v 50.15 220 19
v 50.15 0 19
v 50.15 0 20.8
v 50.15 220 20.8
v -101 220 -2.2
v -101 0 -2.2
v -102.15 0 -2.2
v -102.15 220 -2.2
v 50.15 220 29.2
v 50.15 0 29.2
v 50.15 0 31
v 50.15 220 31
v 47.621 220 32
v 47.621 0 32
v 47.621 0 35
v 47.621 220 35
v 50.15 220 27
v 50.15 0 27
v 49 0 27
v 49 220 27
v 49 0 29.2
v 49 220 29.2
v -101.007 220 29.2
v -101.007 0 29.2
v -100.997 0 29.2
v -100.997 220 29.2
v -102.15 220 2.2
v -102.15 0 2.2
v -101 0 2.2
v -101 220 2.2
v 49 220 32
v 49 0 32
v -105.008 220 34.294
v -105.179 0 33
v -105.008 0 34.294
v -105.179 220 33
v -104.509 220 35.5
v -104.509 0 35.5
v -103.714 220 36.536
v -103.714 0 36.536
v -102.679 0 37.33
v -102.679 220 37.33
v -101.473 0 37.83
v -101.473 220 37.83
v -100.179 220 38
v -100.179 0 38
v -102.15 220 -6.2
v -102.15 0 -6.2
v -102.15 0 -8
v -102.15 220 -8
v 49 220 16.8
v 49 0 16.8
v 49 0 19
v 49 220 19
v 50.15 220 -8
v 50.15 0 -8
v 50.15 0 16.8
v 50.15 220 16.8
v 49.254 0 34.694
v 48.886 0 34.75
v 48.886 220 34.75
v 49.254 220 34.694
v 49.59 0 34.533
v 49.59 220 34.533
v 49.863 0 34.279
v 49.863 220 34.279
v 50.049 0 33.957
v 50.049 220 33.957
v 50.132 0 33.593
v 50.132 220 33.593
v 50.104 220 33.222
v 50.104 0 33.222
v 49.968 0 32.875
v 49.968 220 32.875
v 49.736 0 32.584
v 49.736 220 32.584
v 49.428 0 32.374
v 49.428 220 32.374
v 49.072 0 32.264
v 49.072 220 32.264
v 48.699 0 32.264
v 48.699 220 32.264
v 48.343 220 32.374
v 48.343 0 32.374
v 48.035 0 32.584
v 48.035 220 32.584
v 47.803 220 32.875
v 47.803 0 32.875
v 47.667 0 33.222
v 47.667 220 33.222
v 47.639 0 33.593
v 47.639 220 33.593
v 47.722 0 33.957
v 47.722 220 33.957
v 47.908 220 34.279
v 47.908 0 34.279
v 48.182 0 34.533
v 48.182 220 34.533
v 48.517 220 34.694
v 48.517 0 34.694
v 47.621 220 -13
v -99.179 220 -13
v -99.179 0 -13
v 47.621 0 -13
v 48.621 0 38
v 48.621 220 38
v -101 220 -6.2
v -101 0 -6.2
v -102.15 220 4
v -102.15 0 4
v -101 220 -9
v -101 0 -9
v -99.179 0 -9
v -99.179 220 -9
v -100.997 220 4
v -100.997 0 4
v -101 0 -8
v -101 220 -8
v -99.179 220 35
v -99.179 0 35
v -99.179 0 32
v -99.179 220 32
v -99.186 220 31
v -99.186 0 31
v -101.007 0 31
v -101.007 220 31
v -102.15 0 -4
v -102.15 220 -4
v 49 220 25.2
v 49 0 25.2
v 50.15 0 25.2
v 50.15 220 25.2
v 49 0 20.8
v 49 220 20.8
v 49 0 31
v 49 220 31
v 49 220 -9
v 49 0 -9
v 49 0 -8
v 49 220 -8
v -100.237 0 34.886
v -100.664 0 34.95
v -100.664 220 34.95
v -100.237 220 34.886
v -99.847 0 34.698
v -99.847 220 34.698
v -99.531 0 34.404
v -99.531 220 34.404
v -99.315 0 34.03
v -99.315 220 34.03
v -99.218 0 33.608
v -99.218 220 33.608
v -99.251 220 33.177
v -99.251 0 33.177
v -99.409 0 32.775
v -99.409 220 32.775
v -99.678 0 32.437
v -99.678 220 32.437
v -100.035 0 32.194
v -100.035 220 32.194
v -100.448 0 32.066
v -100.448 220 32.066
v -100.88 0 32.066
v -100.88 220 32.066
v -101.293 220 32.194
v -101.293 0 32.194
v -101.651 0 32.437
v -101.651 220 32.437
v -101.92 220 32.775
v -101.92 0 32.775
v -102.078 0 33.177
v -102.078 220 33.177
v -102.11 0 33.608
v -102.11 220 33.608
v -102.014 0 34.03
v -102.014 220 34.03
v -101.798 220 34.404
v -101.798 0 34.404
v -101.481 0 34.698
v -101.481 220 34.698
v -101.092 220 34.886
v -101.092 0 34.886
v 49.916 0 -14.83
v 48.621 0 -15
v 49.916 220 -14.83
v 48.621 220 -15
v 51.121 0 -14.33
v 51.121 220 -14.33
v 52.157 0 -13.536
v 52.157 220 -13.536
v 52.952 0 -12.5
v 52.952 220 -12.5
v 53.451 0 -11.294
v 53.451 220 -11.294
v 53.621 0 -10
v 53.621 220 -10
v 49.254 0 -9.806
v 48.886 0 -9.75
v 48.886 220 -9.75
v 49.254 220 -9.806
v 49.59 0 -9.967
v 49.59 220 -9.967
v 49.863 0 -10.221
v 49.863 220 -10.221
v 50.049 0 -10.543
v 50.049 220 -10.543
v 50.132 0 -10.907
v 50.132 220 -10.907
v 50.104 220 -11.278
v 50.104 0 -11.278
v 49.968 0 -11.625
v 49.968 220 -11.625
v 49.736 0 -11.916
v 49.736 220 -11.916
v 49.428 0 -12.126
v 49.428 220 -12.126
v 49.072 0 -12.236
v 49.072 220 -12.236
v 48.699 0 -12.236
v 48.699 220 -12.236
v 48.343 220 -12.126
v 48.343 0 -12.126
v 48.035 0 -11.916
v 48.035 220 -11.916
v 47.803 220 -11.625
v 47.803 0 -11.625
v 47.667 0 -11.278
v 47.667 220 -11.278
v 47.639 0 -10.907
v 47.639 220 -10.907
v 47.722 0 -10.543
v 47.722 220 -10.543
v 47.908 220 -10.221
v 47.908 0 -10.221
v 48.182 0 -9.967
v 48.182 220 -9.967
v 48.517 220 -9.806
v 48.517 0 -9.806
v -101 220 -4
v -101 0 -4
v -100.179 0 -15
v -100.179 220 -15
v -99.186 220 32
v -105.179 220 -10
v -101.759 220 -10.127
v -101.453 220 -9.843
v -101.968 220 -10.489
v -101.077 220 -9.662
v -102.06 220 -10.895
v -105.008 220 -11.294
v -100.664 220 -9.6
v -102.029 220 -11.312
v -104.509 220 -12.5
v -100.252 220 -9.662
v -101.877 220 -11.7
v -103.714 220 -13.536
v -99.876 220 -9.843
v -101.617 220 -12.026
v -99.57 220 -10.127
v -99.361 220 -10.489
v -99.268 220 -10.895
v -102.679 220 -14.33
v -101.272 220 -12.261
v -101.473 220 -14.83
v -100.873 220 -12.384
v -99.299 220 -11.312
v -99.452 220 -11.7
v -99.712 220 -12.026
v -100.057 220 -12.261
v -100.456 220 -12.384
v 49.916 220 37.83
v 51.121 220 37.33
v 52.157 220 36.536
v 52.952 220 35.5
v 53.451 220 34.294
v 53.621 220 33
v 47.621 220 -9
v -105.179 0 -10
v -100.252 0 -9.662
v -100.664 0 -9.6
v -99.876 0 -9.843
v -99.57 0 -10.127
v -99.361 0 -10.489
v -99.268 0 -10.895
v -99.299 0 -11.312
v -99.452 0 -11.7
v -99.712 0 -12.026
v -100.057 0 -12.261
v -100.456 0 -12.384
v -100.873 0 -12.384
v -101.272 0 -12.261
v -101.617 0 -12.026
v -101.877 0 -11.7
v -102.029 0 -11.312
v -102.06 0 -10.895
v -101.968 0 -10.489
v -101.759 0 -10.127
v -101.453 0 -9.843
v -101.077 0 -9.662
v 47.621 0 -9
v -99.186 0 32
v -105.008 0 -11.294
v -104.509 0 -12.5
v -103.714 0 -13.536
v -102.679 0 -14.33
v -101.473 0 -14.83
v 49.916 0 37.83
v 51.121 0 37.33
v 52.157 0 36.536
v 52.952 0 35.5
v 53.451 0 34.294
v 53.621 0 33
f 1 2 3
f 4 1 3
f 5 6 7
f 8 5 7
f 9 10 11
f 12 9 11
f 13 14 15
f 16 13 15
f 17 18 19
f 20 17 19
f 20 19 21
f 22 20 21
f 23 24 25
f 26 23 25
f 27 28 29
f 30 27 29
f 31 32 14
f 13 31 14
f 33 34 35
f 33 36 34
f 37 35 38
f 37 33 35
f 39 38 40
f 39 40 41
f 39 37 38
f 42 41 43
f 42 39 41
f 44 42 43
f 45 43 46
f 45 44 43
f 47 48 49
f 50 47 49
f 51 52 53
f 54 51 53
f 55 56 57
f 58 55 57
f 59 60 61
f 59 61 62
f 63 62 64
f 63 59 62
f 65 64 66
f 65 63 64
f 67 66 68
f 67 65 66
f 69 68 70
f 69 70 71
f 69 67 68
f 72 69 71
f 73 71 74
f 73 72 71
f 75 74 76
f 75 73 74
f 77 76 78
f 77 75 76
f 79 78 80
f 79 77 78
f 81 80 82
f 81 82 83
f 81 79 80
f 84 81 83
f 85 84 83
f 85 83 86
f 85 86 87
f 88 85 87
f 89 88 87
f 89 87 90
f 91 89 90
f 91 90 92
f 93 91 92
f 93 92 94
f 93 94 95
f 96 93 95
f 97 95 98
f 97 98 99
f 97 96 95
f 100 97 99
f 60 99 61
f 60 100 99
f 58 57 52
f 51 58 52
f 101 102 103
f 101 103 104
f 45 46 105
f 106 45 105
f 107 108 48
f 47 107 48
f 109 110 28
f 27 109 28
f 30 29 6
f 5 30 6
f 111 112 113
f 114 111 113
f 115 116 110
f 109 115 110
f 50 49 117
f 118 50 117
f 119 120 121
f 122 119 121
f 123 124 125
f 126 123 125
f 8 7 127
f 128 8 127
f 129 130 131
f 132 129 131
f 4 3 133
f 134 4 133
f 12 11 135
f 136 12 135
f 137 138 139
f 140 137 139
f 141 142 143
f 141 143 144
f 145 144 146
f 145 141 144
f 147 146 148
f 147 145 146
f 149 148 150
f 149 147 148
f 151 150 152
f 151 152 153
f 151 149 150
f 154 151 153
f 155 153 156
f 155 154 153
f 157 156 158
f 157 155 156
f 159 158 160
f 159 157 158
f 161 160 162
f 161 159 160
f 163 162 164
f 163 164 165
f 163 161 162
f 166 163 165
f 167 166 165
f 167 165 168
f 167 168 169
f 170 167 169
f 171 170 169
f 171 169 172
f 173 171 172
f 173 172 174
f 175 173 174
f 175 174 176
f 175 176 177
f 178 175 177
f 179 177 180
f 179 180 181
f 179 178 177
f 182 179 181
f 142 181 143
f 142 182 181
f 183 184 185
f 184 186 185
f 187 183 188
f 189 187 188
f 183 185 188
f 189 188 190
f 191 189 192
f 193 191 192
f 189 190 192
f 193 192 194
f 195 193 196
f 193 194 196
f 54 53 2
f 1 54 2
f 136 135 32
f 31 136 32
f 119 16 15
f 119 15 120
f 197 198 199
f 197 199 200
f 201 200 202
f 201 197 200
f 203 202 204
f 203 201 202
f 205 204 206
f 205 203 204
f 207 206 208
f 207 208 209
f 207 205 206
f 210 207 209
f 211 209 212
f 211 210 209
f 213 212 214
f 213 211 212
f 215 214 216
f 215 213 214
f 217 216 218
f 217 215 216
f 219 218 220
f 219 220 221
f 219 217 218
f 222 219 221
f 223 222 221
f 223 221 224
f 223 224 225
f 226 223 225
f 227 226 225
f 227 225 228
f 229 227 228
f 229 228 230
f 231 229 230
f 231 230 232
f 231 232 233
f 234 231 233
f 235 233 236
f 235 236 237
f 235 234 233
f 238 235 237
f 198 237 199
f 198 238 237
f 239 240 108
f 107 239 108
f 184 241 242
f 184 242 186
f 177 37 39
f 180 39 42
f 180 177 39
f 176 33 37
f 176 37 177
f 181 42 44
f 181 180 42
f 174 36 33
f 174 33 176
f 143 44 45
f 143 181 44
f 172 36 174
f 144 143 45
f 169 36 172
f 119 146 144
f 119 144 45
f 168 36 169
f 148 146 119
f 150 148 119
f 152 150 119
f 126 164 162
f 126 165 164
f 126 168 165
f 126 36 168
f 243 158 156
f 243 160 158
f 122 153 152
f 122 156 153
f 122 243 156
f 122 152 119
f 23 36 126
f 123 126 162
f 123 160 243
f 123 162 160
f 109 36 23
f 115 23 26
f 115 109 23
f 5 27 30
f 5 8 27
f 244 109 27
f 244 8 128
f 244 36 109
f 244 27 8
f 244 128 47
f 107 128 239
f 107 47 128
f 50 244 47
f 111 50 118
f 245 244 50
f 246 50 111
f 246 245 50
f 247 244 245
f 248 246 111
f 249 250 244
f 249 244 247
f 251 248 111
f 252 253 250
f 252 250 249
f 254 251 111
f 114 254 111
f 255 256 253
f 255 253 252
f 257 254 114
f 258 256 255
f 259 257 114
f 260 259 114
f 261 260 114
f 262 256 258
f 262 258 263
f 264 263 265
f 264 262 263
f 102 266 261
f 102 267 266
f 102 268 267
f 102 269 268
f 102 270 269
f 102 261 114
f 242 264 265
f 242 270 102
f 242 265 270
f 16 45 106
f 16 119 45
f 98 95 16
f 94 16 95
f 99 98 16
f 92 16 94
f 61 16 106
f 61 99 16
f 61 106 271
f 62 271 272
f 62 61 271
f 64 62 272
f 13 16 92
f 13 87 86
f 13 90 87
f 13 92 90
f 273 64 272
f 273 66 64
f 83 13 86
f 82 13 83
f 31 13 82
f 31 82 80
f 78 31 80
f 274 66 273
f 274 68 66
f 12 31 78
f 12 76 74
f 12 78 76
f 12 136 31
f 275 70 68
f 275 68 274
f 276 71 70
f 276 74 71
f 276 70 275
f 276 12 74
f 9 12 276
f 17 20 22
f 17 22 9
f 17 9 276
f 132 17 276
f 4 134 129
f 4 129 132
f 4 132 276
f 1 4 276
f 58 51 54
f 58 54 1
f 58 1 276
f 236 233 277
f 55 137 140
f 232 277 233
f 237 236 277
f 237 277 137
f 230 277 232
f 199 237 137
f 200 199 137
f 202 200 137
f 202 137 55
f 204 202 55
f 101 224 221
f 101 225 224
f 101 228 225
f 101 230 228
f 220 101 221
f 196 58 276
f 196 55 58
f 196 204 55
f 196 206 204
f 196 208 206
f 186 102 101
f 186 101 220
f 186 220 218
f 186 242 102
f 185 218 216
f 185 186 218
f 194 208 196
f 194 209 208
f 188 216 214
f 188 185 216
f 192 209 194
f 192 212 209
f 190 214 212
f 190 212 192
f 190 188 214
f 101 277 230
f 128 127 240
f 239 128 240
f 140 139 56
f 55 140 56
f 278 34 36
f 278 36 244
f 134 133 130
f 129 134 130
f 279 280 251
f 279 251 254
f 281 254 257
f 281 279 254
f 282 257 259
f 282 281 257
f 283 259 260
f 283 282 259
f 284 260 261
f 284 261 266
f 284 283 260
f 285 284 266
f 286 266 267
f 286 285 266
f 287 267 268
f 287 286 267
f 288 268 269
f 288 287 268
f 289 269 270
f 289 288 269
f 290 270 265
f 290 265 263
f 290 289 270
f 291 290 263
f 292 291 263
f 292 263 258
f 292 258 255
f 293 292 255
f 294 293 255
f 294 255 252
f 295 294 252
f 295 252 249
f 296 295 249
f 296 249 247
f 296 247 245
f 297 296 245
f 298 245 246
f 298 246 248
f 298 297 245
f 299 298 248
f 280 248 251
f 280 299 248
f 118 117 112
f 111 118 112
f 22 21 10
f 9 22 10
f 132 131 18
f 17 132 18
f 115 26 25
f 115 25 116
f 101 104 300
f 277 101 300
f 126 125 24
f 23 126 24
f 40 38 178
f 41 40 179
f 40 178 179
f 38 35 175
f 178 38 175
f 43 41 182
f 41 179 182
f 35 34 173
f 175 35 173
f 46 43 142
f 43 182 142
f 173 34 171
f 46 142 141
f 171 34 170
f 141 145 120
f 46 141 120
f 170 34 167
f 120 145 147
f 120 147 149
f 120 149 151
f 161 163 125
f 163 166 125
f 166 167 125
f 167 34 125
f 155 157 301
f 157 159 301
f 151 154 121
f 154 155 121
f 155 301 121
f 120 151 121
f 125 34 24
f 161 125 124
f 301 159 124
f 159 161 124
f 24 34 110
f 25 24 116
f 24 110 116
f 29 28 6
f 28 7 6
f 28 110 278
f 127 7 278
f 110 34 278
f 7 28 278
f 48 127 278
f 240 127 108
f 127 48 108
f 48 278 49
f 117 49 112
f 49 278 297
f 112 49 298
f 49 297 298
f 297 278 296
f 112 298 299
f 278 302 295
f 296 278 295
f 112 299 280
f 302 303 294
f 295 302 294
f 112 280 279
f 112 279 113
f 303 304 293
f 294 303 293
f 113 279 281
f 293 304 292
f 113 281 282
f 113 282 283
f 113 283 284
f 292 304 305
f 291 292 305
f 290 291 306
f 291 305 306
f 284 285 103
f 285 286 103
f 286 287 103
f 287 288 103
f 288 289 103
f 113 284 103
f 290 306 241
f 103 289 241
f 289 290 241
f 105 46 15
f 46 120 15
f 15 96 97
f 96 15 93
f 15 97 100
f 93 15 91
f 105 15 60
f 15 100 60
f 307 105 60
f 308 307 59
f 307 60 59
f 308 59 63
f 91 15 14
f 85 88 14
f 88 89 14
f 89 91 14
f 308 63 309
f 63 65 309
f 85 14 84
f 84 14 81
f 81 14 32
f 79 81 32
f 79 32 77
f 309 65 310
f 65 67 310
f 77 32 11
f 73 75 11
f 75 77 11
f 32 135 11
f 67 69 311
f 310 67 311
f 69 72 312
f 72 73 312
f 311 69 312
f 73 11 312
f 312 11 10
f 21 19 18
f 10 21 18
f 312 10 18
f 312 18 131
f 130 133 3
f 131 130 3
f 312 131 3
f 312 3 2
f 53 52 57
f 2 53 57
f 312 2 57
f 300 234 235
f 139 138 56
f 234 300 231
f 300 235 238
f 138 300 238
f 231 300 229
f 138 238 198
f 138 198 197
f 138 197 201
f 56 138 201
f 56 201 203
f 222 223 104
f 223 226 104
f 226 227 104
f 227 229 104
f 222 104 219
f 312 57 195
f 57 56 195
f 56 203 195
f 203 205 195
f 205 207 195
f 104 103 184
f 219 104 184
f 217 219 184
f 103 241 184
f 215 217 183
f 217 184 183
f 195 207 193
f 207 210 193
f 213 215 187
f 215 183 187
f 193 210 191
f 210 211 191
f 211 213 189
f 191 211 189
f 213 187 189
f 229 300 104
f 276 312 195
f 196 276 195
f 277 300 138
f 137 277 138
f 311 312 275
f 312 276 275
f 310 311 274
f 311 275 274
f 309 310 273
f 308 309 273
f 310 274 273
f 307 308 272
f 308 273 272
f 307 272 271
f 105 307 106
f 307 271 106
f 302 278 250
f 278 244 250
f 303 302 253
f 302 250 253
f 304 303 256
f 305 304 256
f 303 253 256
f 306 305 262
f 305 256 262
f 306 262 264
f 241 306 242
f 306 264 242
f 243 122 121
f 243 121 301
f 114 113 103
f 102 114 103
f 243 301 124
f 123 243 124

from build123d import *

# Parameters (mm, degrees)
SKETCH1_W           = 158.8
SKETCH1_H           = 53
SKETCH1_R           = 1.4
SKETCH1_R_2         = 1.25
SKETCH1_R_3         = 1.45
BOSS_EXTRUDE1_DEPTH = 220
FILLET1_R           = 5
FILLET2_R           = 5
FILLET3_R           = 5
FILLET4_R           = 5


with BuildPart() as part:
    # Sketch1 → Boss-Extrude1 (new body)
    with BuildSketch(Plane(origin=(0, 0, 0), x_dir=(1, 0, 0), z_dir=(0, 1, 0))):
        with Locations((-25.778590477, -11.5)):
            Rectangle(SKETCH1_W, SKETCH1_H)
        with Locations(Location((-100.664295238, 11, 0), (0, 0, 270))):
            Circle(SKETCH1_R, mode=Mode.SUBTRACT)
        with Locations(Location((48.885704762, 11, 0), (0, 0, 270))):
            Circle(SKETCH1_R_2, mode=Mode.SUBTRACT)
        with Locations(Location((-100.664295238, -33.5, 0), (0, 0, 270))):
            Circle(SKETCH1_R_3, mode=Mode.SUBTRACT)
        with Locations(Location((48.885704762, -33.5, 0), (0, 0, 270))):
            Circle(SKETCH1_R_2, mode=Mode.SUBTRACT)
        Polygon((49, -31), (49, -32), (47.621409523, -32), (47.621409523, -35), (-99.178590477, -35), (-99.178590477, -32), (-99.186141089, -32), (-99.186141089, -31), (-101.006752445, -31), (-101.006752445, -29.2), (-100.997355004, -29.2), (-100.997355004, -4), (-102.15, -4), (-102.15, -2.2), (-101, -2.2), (-101, 2.2), (-102.15, 2.2), (-102.15, 4), (-101, 4), (-101, 6.2), (-102.15, 6.2), (-102.15, 8), (-101, 8), (-101, 9), (-99.178590477, 9), (-99.178590477, 13), (47.621409523, 13), (47.621409523, 9), (49, 9), (49, 8), (50.15, 8), (50.15, -16.8), (49, -16.8), (49, -19), (50.15, -19), (50.15, -20.8), (49, -20.8), (49, -25.2), (50.15, -25.2), (50.15, -27), (49, -27), (49, -29.2), (50.15, -29.2), (50.15, -31), align=None, mode=Mode.SUBTRACT)
    extrude(amount=BOSS_EXTRUDE1_DEPTH)

    # Fillet1
    fillet1_edges = [part.edges().sort_by_distance(p)[0] for p in [
        (-105.178590477, 110, -15),
    ]]
    fillet(fillet1_edges, radius=FILLET1_R)

    # Fillet2
    fillet2_edges = [part.edges().sort_by_distance(p)[0] for p in [
        (-105.178590477, 110, 38),
    ]]
    fillet(fillet2_edges, radius=FILLET2_R)

    # Fillet3
    fillet3_edges = [part.edges().sort_by_distance(p)[0] for p in [
        (53.621409523, 110, -15),
    ]]
    fillet(fillet3_edges, radius=FILLET3_R)

    # Fillet4
    fillet4_edges = [part.edges().sort_by_distance(p)[0] for p in [
        (53.621409523, 110, 38),
    ]]
    fillet(fillet4_edges, radius=FILLET4_R)


solid = part.part
